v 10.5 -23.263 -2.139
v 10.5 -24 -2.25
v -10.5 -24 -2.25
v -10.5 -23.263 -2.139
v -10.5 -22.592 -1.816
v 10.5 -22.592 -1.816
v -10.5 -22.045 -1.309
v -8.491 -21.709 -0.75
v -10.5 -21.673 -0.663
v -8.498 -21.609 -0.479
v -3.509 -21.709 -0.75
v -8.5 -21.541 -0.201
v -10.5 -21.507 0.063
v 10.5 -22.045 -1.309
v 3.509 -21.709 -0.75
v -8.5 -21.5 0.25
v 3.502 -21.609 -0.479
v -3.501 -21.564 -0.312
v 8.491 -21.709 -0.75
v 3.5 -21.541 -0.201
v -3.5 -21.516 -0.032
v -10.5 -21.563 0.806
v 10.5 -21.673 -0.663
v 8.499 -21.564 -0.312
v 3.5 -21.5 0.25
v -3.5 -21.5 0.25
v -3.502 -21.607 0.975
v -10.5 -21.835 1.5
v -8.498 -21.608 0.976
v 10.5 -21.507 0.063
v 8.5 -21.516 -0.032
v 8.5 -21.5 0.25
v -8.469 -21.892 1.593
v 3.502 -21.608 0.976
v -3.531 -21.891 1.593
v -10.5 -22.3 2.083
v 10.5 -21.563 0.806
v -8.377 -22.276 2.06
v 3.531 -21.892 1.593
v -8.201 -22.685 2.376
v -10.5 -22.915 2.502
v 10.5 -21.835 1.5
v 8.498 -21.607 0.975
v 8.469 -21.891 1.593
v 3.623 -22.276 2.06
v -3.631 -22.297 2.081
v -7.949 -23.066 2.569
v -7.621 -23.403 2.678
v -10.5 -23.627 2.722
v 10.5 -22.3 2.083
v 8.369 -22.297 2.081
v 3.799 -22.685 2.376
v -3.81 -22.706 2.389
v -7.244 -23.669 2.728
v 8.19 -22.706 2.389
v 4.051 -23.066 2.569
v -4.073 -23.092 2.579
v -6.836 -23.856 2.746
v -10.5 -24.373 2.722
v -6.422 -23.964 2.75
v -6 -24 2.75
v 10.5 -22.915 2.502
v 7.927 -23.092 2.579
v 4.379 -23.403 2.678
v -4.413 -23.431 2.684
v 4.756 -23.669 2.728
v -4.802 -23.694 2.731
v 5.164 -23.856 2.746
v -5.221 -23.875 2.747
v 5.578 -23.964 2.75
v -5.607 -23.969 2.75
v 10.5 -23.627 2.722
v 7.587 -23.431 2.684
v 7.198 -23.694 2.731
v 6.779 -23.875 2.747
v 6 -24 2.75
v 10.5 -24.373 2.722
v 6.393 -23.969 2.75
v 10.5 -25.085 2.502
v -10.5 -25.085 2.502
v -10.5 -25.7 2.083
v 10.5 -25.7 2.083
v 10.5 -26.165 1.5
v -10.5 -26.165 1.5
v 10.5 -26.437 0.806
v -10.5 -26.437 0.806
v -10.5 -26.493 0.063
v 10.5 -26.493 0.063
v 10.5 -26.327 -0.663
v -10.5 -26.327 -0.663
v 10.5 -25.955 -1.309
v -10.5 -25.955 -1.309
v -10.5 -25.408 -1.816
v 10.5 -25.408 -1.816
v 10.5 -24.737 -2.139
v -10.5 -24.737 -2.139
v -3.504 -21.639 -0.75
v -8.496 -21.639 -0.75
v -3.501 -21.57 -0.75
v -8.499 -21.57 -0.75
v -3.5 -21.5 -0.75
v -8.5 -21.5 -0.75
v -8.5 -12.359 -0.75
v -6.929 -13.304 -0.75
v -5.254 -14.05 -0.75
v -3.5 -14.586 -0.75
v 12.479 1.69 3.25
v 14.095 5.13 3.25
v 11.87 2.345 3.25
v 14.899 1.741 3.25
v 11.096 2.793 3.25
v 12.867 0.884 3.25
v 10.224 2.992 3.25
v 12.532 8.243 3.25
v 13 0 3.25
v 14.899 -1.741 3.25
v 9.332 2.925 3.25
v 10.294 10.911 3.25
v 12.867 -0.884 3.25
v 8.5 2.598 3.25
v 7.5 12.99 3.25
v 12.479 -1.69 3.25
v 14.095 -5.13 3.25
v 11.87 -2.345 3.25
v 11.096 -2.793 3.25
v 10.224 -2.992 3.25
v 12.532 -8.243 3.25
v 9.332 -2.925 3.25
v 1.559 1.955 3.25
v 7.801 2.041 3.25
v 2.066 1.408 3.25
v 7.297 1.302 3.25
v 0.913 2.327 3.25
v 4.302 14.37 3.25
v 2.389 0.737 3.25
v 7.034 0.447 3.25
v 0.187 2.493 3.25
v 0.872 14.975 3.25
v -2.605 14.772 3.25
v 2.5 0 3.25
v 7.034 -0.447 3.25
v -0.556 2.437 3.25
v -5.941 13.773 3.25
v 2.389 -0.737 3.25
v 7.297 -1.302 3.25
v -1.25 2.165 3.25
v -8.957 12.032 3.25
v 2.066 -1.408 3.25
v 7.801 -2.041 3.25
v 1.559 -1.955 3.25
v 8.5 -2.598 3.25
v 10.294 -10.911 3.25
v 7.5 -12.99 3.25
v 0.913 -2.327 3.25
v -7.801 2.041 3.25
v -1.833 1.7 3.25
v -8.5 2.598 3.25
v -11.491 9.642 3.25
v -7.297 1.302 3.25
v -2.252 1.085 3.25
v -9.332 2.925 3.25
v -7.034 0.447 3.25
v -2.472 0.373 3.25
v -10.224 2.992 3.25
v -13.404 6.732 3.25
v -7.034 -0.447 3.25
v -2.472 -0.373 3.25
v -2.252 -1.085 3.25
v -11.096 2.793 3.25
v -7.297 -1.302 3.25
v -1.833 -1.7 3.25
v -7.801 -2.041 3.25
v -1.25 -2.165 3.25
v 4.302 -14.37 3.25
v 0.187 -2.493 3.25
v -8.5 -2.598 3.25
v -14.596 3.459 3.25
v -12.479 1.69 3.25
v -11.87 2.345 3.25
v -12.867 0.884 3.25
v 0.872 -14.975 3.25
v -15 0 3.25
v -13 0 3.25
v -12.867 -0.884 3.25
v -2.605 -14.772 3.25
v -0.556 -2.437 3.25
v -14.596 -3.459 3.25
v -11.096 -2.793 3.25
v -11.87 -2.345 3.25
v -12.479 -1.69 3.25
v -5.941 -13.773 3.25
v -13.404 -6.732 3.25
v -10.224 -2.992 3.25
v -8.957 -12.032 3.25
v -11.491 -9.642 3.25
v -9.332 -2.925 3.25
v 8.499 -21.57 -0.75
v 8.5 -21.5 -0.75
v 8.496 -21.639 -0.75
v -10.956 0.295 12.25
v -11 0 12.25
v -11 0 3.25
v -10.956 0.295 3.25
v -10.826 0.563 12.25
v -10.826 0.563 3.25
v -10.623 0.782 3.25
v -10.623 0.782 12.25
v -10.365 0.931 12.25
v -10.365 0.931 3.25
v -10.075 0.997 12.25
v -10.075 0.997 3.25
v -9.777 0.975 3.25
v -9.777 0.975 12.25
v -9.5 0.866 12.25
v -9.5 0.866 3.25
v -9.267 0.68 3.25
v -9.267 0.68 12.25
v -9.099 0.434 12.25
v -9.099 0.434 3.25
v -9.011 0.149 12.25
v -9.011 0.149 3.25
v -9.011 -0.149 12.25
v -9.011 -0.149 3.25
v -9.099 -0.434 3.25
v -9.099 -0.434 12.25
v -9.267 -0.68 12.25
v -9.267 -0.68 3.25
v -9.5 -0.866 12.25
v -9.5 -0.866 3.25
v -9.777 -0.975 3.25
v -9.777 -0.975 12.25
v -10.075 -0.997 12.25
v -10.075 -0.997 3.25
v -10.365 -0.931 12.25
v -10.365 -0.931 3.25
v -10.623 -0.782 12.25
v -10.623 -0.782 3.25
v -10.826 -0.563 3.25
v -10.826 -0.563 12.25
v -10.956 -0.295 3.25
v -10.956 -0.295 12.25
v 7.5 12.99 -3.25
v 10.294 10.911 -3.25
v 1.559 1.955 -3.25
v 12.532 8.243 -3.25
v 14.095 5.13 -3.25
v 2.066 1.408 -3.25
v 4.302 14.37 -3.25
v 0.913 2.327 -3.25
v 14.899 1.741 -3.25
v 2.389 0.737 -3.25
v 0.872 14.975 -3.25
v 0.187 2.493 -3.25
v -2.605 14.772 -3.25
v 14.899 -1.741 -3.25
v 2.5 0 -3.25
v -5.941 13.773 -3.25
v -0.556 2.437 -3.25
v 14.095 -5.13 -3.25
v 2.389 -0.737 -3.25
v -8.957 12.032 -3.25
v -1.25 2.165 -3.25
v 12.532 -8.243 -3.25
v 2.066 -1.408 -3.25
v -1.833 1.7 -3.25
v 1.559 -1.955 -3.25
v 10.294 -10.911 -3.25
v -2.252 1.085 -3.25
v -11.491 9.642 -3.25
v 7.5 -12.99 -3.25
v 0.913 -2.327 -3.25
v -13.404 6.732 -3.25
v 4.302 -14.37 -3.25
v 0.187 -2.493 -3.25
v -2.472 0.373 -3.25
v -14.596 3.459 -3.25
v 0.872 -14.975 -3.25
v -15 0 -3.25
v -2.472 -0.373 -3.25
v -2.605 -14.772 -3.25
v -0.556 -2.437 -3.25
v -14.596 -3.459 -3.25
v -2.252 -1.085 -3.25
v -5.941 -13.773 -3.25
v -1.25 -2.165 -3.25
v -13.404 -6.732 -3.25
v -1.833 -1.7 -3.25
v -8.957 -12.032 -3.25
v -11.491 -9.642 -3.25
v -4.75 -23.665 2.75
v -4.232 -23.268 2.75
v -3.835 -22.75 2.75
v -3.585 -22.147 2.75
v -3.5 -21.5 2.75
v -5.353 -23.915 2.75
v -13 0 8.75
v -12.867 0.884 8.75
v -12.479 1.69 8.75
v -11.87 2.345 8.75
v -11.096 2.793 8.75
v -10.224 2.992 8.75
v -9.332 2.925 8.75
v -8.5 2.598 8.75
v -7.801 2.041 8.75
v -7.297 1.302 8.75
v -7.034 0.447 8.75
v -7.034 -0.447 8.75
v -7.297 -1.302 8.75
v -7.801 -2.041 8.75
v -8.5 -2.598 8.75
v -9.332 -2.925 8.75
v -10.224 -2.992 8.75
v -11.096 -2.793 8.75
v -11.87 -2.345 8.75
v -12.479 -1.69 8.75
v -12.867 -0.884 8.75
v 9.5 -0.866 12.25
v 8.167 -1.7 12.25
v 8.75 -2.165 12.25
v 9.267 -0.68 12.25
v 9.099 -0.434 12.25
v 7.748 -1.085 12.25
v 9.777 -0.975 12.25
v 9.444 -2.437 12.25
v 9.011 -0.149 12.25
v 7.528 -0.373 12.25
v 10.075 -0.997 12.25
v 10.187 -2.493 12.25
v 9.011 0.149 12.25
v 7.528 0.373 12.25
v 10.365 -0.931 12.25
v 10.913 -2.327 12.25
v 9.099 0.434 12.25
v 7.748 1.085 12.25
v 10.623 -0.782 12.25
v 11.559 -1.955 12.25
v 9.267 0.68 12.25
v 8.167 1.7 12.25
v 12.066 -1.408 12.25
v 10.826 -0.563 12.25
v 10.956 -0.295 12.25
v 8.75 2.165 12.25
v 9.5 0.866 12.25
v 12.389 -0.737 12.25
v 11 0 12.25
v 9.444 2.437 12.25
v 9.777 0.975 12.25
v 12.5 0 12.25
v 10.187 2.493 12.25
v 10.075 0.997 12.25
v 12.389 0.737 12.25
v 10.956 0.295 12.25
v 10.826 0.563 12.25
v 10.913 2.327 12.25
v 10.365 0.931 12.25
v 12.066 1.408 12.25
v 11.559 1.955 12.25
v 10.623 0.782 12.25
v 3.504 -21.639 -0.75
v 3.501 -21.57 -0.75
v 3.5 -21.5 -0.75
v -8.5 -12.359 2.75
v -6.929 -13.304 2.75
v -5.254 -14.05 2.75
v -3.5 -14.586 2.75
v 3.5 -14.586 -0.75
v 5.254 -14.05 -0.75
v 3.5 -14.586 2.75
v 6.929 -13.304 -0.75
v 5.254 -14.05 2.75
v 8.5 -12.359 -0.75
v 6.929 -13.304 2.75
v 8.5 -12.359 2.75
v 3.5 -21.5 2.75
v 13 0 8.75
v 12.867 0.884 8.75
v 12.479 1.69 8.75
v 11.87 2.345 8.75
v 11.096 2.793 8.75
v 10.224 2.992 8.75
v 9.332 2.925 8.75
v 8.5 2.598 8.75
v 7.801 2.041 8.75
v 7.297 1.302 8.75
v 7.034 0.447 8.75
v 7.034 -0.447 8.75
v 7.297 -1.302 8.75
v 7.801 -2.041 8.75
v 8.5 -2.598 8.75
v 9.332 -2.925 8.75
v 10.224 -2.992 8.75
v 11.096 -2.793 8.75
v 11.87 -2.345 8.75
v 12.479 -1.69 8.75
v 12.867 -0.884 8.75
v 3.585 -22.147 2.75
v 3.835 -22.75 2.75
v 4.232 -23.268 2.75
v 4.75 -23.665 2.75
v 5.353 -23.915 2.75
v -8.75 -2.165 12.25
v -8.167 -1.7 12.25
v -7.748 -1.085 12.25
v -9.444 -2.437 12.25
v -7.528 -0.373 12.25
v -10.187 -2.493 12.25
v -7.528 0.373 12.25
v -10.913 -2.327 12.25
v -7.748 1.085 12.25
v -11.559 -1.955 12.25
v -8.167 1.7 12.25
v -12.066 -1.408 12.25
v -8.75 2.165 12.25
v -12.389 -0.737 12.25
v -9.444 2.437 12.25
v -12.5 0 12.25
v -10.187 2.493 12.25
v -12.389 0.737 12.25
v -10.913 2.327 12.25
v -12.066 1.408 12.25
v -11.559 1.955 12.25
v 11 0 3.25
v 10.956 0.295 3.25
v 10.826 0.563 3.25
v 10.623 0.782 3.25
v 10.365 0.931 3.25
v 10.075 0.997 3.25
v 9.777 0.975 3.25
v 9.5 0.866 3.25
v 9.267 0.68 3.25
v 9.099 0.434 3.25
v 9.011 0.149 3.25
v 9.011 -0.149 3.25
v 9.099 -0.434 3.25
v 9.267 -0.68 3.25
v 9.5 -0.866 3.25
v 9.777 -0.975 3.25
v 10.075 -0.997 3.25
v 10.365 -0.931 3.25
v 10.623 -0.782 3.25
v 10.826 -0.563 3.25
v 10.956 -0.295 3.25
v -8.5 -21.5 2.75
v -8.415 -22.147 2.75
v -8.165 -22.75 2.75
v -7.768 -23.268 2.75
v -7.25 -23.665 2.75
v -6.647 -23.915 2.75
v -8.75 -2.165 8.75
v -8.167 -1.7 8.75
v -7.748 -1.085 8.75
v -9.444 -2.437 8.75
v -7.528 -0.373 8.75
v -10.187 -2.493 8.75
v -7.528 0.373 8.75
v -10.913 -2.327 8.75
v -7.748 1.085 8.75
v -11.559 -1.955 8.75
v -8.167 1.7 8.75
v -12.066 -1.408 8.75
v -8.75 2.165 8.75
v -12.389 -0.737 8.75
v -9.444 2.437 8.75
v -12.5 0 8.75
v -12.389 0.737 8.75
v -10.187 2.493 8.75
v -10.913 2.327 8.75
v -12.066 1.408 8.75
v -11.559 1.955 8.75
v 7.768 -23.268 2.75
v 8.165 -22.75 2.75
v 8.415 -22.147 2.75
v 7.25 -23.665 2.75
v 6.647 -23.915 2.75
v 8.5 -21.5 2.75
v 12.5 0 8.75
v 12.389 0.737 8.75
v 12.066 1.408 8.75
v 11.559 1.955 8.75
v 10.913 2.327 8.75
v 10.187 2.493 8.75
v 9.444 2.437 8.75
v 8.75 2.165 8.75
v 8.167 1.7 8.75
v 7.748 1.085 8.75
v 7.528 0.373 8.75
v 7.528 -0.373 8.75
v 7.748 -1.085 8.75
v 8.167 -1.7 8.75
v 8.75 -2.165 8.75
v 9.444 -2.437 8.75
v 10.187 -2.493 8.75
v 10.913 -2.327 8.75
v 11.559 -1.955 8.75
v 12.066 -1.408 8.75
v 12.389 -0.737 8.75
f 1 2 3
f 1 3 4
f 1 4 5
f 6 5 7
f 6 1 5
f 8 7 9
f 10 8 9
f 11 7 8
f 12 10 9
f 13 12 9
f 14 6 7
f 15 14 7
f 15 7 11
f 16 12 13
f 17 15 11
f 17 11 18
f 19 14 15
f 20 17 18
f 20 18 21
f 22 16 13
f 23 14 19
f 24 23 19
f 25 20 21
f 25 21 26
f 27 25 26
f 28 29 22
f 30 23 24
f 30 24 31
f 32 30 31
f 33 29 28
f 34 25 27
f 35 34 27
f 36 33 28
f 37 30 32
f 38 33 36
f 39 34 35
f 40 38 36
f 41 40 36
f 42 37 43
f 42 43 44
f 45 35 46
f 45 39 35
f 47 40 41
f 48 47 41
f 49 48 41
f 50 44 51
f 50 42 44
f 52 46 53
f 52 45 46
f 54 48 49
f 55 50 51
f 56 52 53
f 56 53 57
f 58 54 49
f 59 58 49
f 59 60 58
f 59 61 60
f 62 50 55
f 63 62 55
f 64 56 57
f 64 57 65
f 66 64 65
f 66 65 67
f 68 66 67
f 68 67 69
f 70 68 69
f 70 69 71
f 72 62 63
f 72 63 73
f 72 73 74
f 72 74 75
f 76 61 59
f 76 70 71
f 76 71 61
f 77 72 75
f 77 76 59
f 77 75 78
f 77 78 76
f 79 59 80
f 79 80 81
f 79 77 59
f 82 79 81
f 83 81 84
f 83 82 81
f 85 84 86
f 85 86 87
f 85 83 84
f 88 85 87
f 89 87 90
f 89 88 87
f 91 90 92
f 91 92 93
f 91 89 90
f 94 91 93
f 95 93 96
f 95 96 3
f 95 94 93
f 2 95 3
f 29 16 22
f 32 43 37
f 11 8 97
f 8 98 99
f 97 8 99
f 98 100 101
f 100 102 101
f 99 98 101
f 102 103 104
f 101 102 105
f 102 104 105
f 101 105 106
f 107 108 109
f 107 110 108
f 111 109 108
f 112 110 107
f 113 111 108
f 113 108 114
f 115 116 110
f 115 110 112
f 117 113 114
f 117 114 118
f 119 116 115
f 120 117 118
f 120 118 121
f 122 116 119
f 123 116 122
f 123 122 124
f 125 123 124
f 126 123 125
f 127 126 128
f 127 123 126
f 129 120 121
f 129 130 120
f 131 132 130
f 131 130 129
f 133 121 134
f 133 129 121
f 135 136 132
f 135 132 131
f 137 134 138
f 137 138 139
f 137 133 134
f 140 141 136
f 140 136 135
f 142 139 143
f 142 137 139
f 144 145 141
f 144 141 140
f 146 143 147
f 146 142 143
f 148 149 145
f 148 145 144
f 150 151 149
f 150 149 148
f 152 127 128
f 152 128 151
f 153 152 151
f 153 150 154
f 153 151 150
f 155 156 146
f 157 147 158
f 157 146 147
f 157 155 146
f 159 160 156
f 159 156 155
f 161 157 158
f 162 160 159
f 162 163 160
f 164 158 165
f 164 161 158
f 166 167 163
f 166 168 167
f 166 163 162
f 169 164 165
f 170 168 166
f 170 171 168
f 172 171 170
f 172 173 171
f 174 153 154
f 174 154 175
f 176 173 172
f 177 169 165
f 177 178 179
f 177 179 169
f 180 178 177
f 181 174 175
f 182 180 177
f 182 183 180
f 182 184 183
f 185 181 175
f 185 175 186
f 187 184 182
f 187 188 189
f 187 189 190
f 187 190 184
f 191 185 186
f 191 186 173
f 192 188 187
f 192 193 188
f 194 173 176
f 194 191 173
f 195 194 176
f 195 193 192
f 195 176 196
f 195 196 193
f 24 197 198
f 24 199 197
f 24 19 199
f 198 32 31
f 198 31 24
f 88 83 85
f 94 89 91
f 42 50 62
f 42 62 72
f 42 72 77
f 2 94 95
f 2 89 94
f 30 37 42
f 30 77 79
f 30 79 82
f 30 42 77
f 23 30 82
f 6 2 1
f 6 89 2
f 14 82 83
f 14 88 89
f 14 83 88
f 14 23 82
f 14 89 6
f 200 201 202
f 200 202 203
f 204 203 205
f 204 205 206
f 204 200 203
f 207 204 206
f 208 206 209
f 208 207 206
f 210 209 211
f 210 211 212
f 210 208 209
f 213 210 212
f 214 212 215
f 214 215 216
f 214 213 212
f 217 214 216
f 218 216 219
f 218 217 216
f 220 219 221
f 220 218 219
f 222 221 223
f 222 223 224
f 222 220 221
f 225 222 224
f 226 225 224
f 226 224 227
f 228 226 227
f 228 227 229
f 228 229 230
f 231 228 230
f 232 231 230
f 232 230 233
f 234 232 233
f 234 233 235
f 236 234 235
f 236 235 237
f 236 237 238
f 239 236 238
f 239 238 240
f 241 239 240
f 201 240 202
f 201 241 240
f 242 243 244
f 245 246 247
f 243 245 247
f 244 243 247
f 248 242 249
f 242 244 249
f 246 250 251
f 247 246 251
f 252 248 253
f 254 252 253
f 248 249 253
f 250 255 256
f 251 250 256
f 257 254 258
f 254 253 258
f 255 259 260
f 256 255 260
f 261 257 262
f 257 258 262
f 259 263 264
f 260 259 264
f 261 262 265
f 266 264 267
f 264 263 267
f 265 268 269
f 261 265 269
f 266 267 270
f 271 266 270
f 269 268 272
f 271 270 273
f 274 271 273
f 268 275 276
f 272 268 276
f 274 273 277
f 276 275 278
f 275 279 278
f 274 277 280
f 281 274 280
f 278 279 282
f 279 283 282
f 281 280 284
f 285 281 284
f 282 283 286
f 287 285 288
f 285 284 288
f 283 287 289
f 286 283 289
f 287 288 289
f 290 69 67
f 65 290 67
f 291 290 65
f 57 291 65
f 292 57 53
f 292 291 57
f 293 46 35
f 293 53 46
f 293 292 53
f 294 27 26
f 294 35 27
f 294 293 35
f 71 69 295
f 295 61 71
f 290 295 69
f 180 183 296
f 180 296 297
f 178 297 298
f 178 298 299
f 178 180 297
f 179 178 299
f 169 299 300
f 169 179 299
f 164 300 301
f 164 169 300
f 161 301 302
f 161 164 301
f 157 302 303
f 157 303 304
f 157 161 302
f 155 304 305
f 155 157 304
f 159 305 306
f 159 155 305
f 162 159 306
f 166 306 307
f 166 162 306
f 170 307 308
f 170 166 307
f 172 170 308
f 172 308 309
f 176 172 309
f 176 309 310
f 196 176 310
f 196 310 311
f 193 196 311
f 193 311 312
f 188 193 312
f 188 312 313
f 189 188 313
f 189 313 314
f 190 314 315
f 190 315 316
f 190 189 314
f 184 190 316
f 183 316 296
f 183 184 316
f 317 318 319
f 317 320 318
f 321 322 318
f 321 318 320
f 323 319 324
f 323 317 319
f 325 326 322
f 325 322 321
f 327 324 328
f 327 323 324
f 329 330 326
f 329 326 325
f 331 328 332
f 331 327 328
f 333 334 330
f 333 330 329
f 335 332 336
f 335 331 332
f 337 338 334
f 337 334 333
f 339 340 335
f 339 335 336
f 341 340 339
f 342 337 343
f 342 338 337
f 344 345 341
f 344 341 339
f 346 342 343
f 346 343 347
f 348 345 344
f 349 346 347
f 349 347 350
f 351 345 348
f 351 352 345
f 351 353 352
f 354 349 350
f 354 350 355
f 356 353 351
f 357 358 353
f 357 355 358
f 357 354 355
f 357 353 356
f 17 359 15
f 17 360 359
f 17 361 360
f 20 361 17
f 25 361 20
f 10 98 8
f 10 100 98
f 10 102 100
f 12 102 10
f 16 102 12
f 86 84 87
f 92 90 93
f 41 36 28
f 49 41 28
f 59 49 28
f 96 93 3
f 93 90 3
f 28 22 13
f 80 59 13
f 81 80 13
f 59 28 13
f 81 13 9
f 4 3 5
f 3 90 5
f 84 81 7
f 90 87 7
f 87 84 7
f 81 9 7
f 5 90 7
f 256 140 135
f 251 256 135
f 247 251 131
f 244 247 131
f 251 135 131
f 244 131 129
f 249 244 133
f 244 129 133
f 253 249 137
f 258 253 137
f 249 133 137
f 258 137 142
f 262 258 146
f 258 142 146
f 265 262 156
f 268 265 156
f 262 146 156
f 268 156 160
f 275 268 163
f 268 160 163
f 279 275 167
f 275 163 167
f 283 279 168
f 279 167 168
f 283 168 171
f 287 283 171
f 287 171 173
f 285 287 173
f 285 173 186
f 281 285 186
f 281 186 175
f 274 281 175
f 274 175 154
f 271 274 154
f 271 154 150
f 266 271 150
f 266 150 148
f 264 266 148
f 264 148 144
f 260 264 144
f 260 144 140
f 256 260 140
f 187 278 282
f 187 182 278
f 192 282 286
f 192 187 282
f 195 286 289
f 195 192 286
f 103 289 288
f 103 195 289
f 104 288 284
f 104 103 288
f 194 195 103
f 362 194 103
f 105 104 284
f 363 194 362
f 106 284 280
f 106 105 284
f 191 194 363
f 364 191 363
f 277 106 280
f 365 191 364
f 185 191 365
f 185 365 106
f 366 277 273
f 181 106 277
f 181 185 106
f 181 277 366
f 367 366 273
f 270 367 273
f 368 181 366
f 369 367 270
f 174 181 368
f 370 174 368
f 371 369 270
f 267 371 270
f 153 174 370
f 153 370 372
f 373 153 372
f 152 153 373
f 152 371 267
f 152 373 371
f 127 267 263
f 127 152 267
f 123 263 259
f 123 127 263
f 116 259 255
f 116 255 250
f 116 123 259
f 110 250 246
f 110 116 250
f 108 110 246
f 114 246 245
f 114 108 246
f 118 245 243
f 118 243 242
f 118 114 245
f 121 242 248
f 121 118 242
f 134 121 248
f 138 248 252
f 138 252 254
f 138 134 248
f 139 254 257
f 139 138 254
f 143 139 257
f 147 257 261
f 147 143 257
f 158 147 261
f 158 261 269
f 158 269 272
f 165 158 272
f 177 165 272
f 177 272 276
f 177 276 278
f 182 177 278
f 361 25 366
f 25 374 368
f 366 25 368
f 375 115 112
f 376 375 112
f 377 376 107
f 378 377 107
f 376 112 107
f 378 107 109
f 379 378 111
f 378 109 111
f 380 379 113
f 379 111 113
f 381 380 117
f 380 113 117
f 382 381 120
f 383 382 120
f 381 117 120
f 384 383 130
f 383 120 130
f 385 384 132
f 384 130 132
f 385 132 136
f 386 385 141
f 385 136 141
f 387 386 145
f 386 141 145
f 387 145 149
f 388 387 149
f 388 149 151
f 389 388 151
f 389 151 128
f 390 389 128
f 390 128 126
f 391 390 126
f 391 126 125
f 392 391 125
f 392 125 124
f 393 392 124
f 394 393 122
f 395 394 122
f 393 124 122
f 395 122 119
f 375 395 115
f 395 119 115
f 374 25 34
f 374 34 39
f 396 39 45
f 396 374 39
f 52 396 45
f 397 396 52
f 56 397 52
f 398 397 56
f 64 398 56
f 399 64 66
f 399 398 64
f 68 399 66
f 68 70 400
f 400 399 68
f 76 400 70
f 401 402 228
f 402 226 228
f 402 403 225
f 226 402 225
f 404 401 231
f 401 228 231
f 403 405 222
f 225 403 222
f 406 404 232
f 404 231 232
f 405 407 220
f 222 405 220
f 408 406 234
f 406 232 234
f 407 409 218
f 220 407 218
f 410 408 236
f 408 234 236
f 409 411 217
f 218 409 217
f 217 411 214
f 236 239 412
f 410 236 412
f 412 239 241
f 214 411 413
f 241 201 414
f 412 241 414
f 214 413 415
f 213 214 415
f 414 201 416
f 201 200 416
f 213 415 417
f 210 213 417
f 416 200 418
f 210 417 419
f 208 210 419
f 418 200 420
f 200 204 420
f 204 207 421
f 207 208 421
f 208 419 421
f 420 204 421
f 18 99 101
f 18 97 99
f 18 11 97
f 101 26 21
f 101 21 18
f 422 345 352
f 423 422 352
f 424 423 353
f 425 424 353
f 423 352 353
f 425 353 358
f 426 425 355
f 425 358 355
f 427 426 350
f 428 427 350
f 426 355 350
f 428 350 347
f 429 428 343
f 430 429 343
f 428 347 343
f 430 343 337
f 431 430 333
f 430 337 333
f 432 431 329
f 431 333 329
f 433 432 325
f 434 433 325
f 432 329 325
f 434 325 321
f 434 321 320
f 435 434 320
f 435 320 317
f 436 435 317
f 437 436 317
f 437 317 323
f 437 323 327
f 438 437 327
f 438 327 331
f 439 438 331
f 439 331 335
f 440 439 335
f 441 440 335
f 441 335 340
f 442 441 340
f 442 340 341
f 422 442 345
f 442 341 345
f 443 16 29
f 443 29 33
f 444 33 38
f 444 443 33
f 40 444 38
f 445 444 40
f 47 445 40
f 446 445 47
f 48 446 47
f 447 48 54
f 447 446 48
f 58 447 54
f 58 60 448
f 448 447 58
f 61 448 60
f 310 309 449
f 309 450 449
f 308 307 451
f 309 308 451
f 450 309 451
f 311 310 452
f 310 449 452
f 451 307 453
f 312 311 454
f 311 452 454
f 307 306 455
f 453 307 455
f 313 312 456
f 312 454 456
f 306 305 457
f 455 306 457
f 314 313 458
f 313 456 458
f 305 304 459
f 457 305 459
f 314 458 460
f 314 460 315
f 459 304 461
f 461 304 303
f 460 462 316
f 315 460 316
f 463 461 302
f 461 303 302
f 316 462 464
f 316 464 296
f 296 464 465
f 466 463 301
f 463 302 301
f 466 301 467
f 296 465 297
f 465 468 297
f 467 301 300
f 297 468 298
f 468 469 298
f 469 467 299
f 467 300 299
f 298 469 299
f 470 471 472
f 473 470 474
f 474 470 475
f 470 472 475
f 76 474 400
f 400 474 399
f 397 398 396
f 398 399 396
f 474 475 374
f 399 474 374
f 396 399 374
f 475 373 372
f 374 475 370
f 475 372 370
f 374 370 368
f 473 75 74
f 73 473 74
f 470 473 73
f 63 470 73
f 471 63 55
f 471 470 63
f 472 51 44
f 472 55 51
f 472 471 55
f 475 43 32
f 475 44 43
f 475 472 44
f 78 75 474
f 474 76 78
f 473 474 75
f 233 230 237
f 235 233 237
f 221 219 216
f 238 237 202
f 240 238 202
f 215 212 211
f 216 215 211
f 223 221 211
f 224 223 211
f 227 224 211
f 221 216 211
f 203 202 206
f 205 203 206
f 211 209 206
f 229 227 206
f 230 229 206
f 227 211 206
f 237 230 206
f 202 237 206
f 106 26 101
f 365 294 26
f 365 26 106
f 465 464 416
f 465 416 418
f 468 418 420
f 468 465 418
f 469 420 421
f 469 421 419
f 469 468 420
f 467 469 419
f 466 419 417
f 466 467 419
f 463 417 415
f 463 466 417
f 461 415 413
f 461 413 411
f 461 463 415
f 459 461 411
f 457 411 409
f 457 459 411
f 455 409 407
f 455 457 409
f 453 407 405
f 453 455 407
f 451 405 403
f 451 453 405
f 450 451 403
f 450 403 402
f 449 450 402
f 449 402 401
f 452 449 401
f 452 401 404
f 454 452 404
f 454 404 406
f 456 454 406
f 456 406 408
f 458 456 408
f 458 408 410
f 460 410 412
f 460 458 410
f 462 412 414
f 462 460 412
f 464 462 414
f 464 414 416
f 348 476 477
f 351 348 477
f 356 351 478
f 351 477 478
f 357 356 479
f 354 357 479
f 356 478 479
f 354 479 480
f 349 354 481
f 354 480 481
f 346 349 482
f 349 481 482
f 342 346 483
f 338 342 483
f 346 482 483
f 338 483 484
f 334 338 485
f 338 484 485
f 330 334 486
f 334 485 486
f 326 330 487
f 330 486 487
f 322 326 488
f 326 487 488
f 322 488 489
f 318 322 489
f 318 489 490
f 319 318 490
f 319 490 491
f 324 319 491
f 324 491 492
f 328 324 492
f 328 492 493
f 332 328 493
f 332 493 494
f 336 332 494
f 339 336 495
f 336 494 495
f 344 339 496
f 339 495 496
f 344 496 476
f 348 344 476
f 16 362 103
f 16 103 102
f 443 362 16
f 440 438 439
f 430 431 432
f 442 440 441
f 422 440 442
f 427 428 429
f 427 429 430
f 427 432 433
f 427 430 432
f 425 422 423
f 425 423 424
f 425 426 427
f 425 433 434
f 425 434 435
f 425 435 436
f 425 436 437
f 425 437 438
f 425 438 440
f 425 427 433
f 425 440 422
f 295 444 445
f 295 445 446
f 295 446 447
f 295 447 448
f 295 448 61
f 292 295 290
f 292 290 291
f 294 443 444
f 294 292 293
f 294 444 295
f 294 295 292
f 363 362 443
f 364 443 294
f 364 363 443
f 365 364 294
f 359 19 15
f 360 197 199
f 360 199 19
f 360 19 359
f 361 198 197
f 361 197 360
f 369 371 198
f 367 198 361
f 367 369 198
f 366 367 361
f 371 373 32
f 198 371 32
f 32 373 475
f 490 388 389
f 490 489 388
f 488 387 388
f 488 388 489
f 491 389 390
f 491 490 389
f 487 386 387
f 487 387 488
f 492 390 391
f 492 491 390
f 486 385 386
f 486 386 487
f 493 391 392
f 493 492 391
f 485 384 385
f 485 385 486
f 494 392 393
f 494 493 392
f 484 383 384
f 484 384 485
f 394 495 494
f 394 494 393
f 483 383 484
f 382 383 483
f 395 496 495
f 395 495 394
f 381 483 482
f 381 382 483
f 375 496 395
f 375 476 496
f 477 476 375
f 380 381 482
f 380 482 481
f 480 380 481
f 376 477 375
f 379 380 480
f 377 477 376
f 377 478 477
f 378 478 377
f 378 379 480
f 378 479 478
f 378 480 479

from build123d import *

# Parameters (mm, degrees)
SKETCH1_R                   = 15
BOSS_EXTRUDE1_DEPTH         = 3.25
BOSS_EXTRUDE2_START         = -0.5
BOSS_EXTRUDE2_DEPTH         = 3.5
FILLET1_RADIUS              = 2.5
FILLET1_LENGTH              = 3.5
FILLET1_OF_MIRROR1_2_RADIUS = 2.5
FILLET1_OF_MIRROR1_2_LENGTH = 3.5
SKETCH3_R                   = 2.5
BOSS_EXTRUDE3_DEPTH         = 10.5
SKETCH4_R                   = 3
BOSS_EXTRUDE4_DEPTH         = 5.5
SKETCH5_R                   = 2.5
BOSS_EXTRUDE5_DEPTH         = 3.5
SKETCH6_R                   = 1
CUT_EXTRUDE1_DEPTH          = 9
SKETCH7_R                   = 2.5
CUT_EXTRUDE2_DEPTH          = 32.752952702


with BuildPart() as part:
    # Sketch1 → Boss-Extrude1 (new, symmetric)
    with BuildSketch(Plane.XY):
        with Locations(Location((0, 0, 0), (0, 0, 180))):
            Circle(SKETCH1_R)
    extrude(amount=BOSS_EXTRUDE1_DEPTH, both=True)

    # Sketch2 → Boss-Extrude2 (add)
    with BuildSketch(Plane.XY.offset(3.25).offset(BOSS_EXTRUDE2_START)):
        with BuildLine():
            Line((-8.5, -12.359207094), (-8.5, -24))
            Line((-8.5, -24), (-3.5, -24))
            Line((-3.5, -24), (-3.5, -14.585952146))
            ThreePointArc((-3.5, -14.585952146), (-6.102425615, -13.702569161), (-8.5, -12.359207094))
        make_face()
    boss_extrude2 = extrude(amount=-BOSS_EXTRUDE2_DEPTH)

    # Fillet1: full round fillet: the end face becomes a half cylinder, R = half its width
    fillet1_face = Plane((-6, -24, 1), x_dir=(0, 0, 1), z_dir=(0, -1, 0))  # on the end face: x along it, z out of the body
    fillet1_slab = fillet1_face.offset(-FILLET1_RADIUS / 2) * Box(FILLET1_LENGTH, 2 * FILLET1_RADIUS, FILLET1_RADIUS, mode=Mode.PRIVATE)  # the body's end, R deep
    fillet1_round = Plane((-6, -21.5, 1), x_dir=(0, -1, 0), z_dir=(0, 0, 1)) * Cylinder(FILLET1_RADIUS, FILLET1_LENGTH, mode=Mode.PRIVATE)  # its axis R under the face
    add(fillet1_slab - fillet1_round, mode=Mode.SUBTRACT)

    # Mirror1: Boss-Extrude2 across plane
    add(boss_extrude2.mirror(Plane(origin=(0, 0, 0), x_dir=(0, 0, 1), z_dir=(1, 0, 0))))

    # Fillet1 of Mirror1 2: full round fillet: the end face becomes a half cylinder, R = half its width
    fillet1_of_mirror1_2_face = Plane((6, -24, 1), x_dir=(0, 0, 1), z_dir=(0, -1, 0))  # on the end face: x along it, z out of the body
    fillet1_of_mirror1_2_slab = fillet1_of_mirror1_2_face.offset(-FILLET1_OF_MIRROR1_2_RADIUS / 2) * Box(FILLET1_OF_MIRROR1_2_LENGTH, 2 * FILLET1_OF_MIRROR1_2_RADIUS, FILLET1_OF_MIRROR1_2_RADIUS, mode=Mode.PRIVATE)  # the body's end, R deep
    fillet1_of_mirror1_2_round = Plane((6, -21.5, 1), x_dir=(0, -1, 0), z_dir=(0, 0, 1)) * Cylinder(FILLET1_OF_MIRROR1_2_RADIUS, FILLET1_OF_MIRROR1_2_LENGTH, mode=Mode.PRIVATE)  # its axis R under the face
    add(fillet1_of_mirror1_2_slab - fillet1_of_mirror1_2_round, mode=Mode.SUBTRACT)

    # Sketch3 → Boss-Extrude3 (add, symmetric)
    with BuildSketch(Plane(origin=(0, 0, 0), x_dir=(0, 0, -1), z_dir=(1, 0, 0))):
        with Locations((-0.25, -24)):
            Circle(SKETCH3_R)
    extrude(amount=BOSS_EXTRUDE3_DEPTH, both=True)

    # Sketch4 → Boss-Extrude4 (add)
    with BuildSketch(Plane.XY.offset(3.25)):
        with Locations((10, 0)):
            Circle(SKETCH4_R)
    boss_extrude4 = extrude(amount=BOSS_EXTRUDE4_DEPTH)

    # Sketch5 → Boss-Extrude5 (add)
    with BuildSketch(Plane.XY.offset(8.75)):
        with Locations((10, 0)):
            Circle(SKETCH5_R)
    boss_extrude5 = extrude(amount=BOSS_EXTRUDE5_DEPTH)

    # Sketch6 → Cut-Extrude1 (cut)
    with BuildSketch(Plane.XY.offset(12.25)):
        with Locations((10, 0)):
            Circle(SKETCH6_R)
    cut_extrude1 = extrude(amount=-CUT_EXTRUDE1_DEPTH, mode=Mode.SUBTRACT)

    # Mirror2: Boss-Extrude4, Boss-Extrude5, Cut-Extrude1 across plane
    add(boss_extrude4.mirror(Plane(origin=(0, 0, 0), x_dir=(0, 0, 1), z_dir=(1, 0, 0))))
    add(boss_extrude5.mirror(Plane(origin=(0, 0, 0), x_dir=(0, 0, 1), z_dir=(1, 0, 0))))
    add(cut_extrude1.mirror(Plane(origin=(0, 0, 0), x_dir=(0, 0, 1), z_dir=(1, 0, 0))), mode=Mode.SUBTRACT)

    # Sketch7 → Cut-Extrude2 (cut, through all)
    with BuildSketch(Plane.XY.offset(3.25)):
        Circle(SKETCH7_R)
    extrude(amount=-CUT_EXTRUDE2_DEPTH, mode=Mode.SUBTRACT)


solid = part.part
